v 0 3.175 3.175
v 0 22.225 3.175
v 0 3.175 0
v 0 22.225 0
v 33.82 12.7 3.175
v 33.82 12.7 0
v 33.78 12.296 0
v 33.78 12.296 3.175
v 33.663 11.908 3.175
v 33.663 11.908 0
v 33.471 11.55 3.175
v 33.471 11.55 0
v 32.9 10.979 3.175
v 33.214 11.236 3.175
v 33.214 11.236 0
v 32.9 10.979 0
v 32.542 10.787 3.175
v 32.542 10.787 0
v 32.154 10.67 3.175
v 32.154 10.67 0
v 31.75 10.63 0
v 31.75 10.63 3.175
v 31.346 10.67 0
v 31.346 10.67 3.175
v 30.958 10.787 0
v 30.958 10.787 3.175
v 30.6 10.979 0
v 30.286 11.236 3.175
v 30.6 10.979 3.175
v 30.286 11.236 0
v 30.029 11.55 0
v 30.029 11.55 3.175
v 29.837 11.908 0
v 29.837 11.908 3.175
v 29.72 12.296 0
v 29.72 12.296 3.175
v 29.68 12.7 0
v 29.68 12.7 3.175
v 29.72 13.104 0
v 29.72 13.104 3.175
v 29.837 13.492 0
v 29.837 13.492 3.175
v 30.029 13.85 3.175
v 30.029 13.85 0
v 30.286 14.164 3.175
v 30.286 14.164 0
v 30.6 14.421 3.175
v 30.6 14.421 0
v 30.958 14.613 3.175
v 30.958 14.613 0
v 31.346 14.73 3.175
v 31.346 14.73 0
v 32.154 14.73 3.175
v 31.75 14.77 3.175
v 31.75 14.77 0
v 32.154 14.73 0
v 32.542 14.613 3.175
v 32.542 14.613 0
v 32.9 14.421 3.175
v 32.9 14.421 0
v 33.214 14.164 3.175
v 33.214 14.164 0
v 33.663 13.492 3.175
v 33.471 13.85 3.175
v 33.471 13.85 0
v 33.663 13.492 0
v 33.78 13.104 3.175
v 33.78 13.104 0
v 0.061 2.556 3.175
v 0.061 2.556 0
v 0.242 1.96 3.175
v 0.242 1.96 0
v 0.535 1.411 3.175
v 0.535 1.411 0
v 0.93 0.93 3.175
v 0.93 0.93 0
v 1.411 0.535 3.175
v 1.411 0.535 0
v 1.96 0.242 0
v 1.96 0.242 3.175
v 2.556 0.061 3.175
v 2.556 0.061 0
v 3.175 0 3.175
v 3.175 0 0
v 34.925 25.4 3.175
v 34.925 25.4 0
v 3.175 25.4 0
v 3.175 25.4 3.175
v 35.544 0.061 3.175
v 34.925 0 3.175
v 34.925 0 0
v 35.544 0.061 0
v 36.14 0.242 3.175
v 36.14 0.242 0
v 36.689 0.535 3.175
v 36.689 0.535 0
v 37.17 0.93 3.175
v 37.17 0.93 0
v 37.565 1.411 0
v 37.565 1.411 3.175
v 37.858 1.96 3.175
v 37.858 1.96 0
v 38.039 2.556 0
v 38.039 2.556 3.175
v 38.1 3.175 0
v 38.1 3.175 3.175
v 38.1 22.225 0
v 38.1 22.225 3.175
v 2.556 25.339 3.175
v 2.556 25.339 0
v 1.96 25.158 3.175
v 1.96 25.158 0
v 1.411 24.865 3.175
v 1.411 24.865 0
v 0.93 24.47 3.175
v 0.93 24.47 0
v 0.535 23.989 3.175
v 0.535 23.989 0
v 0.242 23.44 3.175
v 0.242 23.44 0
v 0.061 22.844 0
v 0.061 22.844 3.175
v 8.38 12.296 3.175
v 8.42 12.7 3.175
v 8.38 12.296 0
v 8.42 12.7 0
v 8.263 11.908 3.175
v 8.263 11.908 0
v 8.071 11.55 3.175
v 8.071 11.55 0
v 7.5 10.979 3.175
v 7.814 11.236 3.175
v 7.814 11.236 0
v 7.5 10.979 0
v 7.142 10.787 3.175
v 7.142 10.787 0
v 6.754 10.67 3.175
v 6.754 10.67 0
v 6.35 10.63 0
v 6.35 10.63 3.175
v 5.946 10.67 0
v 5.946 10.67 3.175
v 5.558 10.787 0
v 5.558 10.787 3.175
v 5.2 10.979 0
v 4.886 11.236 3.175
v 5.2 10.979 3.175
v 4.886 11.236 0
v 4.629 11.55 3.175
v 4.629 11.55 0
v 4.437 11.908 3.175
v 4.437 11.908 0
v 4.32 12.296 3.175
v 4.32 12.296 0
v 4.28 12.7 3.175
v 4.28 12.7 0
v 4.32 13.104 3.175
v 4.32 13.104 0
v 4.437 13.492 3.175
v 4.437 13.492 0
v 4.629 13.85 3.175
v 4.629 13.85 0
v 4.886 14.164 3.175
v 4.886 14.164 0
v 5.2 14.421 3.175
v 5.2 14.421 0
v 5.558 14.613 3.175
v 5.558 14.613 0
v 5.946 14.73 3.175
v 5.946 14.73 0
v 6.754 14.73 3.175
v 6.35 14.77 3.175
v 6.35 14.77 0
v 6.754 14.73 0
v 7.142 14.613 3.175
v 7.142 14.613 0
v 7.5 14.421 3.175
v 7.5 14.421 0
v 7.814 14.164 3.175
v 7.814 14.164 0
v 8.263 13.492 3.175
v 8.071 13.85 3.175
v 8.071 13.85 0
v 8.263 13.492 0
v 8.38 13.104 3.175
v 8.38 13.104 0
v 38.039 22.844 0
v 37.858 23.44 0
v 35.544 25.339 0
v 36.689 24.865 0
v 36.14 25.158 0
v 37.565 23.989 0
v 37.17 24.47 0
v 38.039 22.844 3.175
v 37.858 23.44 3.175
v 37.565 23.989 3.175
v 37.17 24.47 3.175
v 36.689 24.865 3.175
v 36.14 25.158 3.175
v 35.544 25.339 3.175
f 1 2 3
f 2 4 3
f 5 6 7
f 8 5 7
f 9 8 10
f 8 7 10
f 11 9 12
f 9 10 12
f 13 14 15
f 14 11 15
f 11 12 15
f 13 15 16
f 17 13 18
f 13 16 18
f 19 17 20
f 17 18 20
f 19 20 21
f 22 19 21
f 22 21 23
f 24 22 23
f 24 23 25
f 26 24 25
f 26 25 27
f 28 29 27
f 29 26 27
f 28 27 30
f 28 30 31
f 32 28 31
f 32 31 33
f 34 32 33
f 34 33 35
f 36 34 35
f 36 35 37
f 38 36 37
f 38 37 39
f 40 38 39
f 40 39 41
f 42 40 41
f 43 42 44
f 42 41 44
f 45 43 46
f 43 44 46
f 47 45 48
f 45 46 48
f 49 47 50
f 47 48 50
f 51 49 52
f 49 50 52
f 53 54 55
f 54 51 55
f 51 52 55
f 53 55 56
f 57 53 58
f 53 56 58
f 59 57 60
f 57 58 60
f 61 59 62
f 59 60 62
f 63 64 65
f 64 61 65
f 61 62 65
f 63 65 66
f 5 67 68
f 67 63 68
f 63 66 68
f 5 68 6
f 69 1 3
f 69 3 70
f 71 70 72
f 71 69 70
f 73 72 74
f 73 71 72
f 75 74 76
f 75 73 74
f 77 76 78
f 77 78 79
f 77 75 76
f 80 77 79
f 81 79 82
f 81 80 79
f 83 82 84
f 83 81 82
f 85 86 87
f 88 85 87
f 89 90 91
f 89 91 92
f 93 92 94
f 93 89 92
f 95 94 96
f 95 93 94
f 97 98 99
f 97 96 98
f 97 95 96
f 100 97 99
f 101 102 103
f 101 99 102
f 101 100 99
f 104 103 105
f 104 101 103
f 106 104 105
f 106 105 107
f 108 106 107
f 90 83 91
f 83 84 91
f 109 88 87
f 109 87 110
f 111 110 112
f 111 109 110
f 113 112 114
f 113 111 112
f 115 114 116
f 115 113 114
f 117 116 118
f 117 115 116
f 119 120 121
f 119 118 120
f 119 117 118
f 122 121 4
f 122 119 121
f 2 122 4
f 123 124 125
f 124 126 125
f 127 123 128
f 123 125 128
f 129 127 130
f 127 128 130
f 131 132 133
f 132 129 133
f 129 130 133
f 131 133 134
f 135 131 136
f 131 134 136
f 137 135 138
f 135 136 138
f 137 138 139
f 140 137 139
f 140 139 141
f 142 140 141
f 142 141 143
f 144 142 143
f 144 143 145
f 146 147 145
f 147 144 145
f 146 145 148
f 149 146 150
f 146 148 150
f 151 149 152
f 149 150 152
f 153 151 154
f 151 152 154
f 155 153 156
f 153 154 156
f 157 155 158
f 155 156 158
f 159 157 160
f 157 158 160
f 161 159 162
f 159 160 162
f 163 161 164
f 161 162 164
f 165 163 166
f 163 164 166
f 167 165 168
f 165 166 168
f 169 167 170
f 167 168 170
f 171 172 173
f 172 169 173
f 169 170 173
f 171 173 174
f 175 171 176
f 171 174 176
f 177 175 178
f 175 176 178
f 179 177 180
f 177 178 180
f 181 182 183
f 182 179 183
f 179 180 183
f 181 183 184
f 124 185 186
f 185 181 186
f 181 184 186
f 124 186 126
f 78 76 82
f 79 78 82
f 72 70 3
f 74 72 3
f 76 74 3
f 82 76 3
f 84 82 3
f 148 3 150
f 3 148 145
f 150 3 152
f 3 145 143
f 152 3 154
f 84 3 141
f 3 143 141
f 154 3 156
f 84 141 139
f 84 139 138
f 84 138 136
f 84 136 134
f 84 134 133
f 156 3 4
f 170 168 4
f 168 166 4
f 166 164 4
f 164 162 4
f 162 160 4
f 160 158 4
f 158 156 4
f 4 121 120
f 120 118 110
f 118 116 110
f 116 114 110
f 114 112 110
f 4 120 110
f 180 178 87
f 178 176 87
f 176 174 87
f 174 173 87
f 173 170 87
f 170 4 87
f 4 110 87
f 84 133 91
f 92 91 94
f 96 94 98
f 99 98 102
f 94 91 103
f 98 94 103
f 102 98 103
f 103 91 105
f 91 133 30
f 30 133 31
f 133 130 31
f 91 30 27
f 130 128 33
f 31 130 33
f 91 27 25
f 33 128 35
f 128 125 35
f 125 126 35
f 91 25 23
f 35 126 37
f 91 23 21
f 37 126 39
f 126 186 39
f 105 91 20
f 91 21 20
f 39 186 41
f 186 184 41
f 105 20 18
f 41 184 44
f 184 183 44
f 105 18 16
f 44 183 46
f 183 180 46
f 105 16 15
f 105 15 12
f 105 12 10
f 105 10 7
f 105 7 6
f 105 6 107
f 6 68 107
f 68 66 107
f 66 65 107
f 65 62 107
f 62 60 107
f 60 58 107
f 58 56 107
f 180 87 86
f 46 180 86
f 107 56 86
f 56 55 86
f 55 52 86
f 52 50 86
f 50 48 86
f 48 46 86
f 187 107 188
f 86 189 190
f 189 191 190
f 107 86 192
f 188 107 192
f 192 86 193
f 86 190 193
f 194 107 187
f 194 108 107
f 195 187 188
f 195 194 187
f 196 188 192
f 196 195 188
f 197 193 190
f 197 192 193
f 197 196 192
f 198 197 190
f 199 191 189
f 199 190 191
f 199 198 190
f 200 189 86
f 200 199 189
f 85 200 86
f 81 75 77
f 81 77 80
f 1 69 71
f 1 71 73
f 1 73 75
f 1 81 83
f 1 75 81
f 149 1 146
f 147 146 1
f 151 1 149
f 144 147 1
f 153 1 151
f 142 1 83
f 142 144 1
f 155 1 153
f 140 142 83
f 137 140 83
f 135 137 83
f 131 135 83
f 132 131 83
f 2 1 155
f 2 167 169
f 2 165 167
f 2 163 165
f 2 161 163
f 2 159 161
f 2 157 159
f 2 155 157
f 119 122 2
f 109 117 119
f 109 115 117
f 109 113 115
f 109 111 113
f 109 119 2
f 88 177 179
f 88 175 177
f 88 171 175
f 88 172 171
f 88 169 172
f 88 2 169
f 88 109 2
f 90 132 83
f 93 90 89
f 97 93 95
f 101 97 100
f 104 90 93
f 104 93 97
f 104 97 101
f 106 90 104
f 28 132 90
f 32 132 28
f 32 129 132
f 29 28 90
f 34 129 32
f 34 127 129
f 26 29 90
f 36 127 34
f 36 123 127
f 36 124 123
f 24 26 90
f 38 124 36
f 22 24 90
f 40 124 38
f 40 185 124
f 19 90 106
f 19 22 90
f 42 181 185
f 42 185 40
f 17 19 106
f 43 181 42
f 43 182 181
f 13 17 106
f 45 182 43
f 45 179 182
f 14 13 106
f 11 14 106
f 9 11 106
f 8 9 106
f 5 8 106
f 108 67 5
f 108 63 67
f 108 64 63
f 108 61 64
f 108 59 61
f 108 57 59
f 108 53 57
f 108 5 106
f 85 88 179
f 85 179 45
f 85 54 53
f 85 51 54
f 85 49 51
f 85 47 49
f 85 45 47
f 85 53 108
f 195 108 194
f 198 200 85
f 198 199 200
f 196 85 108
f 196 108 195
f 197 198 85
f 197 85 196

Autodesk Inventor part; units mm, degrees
ref_plane "YZ Plane" through (0, 0, 0) normal (1, 0, 0) x (0, 1, 0)
ref_plane "XZ Plane" through (0, 0, 0) normal (0, 1, 0) x (-1, 0, 0)
ref_plane "XY Plane" through (0, 0, 0) normal (0, 0, 1) x (1, 0, 0)
sketch "Sketch1" plane through (0, 0, 0) normal (0, 0, 1) x (1, 0, 0)
  line L0 (0, 0) -> (38.1, 0)
  line L1 (38.1, 0) -> (38.1, 25.4)
  line L2 (38.1, 25.4) -> (0, 25.4)
  line L3 (0, 25.4) -> (0, 0)
  circle A0 centre (6.35, 12.7) radius 2.0701
  circle A1 centre (31.75, 12.7) radius 2.0701
  dimension "d0" = 38.1
  dimension "d1" = 25.4
  dimension "d2" = 4.1402
  dimension "d3" = 6.35
  dimension "d4" = 12.7
  dimension "d24" = 25.4
extrude "Extrusion1" add sketch "Sketch1" along normal blind 3.175
fillet "Fillet1" radius 3.175 4 edges at (38.1, 25.4, 1.5875) (38.1, 0, 1.5875) (0, 25.4, 1.5875) (0, 0, 1.5875)
properties part number "Spacer 2" material "Aluminum 6061"
